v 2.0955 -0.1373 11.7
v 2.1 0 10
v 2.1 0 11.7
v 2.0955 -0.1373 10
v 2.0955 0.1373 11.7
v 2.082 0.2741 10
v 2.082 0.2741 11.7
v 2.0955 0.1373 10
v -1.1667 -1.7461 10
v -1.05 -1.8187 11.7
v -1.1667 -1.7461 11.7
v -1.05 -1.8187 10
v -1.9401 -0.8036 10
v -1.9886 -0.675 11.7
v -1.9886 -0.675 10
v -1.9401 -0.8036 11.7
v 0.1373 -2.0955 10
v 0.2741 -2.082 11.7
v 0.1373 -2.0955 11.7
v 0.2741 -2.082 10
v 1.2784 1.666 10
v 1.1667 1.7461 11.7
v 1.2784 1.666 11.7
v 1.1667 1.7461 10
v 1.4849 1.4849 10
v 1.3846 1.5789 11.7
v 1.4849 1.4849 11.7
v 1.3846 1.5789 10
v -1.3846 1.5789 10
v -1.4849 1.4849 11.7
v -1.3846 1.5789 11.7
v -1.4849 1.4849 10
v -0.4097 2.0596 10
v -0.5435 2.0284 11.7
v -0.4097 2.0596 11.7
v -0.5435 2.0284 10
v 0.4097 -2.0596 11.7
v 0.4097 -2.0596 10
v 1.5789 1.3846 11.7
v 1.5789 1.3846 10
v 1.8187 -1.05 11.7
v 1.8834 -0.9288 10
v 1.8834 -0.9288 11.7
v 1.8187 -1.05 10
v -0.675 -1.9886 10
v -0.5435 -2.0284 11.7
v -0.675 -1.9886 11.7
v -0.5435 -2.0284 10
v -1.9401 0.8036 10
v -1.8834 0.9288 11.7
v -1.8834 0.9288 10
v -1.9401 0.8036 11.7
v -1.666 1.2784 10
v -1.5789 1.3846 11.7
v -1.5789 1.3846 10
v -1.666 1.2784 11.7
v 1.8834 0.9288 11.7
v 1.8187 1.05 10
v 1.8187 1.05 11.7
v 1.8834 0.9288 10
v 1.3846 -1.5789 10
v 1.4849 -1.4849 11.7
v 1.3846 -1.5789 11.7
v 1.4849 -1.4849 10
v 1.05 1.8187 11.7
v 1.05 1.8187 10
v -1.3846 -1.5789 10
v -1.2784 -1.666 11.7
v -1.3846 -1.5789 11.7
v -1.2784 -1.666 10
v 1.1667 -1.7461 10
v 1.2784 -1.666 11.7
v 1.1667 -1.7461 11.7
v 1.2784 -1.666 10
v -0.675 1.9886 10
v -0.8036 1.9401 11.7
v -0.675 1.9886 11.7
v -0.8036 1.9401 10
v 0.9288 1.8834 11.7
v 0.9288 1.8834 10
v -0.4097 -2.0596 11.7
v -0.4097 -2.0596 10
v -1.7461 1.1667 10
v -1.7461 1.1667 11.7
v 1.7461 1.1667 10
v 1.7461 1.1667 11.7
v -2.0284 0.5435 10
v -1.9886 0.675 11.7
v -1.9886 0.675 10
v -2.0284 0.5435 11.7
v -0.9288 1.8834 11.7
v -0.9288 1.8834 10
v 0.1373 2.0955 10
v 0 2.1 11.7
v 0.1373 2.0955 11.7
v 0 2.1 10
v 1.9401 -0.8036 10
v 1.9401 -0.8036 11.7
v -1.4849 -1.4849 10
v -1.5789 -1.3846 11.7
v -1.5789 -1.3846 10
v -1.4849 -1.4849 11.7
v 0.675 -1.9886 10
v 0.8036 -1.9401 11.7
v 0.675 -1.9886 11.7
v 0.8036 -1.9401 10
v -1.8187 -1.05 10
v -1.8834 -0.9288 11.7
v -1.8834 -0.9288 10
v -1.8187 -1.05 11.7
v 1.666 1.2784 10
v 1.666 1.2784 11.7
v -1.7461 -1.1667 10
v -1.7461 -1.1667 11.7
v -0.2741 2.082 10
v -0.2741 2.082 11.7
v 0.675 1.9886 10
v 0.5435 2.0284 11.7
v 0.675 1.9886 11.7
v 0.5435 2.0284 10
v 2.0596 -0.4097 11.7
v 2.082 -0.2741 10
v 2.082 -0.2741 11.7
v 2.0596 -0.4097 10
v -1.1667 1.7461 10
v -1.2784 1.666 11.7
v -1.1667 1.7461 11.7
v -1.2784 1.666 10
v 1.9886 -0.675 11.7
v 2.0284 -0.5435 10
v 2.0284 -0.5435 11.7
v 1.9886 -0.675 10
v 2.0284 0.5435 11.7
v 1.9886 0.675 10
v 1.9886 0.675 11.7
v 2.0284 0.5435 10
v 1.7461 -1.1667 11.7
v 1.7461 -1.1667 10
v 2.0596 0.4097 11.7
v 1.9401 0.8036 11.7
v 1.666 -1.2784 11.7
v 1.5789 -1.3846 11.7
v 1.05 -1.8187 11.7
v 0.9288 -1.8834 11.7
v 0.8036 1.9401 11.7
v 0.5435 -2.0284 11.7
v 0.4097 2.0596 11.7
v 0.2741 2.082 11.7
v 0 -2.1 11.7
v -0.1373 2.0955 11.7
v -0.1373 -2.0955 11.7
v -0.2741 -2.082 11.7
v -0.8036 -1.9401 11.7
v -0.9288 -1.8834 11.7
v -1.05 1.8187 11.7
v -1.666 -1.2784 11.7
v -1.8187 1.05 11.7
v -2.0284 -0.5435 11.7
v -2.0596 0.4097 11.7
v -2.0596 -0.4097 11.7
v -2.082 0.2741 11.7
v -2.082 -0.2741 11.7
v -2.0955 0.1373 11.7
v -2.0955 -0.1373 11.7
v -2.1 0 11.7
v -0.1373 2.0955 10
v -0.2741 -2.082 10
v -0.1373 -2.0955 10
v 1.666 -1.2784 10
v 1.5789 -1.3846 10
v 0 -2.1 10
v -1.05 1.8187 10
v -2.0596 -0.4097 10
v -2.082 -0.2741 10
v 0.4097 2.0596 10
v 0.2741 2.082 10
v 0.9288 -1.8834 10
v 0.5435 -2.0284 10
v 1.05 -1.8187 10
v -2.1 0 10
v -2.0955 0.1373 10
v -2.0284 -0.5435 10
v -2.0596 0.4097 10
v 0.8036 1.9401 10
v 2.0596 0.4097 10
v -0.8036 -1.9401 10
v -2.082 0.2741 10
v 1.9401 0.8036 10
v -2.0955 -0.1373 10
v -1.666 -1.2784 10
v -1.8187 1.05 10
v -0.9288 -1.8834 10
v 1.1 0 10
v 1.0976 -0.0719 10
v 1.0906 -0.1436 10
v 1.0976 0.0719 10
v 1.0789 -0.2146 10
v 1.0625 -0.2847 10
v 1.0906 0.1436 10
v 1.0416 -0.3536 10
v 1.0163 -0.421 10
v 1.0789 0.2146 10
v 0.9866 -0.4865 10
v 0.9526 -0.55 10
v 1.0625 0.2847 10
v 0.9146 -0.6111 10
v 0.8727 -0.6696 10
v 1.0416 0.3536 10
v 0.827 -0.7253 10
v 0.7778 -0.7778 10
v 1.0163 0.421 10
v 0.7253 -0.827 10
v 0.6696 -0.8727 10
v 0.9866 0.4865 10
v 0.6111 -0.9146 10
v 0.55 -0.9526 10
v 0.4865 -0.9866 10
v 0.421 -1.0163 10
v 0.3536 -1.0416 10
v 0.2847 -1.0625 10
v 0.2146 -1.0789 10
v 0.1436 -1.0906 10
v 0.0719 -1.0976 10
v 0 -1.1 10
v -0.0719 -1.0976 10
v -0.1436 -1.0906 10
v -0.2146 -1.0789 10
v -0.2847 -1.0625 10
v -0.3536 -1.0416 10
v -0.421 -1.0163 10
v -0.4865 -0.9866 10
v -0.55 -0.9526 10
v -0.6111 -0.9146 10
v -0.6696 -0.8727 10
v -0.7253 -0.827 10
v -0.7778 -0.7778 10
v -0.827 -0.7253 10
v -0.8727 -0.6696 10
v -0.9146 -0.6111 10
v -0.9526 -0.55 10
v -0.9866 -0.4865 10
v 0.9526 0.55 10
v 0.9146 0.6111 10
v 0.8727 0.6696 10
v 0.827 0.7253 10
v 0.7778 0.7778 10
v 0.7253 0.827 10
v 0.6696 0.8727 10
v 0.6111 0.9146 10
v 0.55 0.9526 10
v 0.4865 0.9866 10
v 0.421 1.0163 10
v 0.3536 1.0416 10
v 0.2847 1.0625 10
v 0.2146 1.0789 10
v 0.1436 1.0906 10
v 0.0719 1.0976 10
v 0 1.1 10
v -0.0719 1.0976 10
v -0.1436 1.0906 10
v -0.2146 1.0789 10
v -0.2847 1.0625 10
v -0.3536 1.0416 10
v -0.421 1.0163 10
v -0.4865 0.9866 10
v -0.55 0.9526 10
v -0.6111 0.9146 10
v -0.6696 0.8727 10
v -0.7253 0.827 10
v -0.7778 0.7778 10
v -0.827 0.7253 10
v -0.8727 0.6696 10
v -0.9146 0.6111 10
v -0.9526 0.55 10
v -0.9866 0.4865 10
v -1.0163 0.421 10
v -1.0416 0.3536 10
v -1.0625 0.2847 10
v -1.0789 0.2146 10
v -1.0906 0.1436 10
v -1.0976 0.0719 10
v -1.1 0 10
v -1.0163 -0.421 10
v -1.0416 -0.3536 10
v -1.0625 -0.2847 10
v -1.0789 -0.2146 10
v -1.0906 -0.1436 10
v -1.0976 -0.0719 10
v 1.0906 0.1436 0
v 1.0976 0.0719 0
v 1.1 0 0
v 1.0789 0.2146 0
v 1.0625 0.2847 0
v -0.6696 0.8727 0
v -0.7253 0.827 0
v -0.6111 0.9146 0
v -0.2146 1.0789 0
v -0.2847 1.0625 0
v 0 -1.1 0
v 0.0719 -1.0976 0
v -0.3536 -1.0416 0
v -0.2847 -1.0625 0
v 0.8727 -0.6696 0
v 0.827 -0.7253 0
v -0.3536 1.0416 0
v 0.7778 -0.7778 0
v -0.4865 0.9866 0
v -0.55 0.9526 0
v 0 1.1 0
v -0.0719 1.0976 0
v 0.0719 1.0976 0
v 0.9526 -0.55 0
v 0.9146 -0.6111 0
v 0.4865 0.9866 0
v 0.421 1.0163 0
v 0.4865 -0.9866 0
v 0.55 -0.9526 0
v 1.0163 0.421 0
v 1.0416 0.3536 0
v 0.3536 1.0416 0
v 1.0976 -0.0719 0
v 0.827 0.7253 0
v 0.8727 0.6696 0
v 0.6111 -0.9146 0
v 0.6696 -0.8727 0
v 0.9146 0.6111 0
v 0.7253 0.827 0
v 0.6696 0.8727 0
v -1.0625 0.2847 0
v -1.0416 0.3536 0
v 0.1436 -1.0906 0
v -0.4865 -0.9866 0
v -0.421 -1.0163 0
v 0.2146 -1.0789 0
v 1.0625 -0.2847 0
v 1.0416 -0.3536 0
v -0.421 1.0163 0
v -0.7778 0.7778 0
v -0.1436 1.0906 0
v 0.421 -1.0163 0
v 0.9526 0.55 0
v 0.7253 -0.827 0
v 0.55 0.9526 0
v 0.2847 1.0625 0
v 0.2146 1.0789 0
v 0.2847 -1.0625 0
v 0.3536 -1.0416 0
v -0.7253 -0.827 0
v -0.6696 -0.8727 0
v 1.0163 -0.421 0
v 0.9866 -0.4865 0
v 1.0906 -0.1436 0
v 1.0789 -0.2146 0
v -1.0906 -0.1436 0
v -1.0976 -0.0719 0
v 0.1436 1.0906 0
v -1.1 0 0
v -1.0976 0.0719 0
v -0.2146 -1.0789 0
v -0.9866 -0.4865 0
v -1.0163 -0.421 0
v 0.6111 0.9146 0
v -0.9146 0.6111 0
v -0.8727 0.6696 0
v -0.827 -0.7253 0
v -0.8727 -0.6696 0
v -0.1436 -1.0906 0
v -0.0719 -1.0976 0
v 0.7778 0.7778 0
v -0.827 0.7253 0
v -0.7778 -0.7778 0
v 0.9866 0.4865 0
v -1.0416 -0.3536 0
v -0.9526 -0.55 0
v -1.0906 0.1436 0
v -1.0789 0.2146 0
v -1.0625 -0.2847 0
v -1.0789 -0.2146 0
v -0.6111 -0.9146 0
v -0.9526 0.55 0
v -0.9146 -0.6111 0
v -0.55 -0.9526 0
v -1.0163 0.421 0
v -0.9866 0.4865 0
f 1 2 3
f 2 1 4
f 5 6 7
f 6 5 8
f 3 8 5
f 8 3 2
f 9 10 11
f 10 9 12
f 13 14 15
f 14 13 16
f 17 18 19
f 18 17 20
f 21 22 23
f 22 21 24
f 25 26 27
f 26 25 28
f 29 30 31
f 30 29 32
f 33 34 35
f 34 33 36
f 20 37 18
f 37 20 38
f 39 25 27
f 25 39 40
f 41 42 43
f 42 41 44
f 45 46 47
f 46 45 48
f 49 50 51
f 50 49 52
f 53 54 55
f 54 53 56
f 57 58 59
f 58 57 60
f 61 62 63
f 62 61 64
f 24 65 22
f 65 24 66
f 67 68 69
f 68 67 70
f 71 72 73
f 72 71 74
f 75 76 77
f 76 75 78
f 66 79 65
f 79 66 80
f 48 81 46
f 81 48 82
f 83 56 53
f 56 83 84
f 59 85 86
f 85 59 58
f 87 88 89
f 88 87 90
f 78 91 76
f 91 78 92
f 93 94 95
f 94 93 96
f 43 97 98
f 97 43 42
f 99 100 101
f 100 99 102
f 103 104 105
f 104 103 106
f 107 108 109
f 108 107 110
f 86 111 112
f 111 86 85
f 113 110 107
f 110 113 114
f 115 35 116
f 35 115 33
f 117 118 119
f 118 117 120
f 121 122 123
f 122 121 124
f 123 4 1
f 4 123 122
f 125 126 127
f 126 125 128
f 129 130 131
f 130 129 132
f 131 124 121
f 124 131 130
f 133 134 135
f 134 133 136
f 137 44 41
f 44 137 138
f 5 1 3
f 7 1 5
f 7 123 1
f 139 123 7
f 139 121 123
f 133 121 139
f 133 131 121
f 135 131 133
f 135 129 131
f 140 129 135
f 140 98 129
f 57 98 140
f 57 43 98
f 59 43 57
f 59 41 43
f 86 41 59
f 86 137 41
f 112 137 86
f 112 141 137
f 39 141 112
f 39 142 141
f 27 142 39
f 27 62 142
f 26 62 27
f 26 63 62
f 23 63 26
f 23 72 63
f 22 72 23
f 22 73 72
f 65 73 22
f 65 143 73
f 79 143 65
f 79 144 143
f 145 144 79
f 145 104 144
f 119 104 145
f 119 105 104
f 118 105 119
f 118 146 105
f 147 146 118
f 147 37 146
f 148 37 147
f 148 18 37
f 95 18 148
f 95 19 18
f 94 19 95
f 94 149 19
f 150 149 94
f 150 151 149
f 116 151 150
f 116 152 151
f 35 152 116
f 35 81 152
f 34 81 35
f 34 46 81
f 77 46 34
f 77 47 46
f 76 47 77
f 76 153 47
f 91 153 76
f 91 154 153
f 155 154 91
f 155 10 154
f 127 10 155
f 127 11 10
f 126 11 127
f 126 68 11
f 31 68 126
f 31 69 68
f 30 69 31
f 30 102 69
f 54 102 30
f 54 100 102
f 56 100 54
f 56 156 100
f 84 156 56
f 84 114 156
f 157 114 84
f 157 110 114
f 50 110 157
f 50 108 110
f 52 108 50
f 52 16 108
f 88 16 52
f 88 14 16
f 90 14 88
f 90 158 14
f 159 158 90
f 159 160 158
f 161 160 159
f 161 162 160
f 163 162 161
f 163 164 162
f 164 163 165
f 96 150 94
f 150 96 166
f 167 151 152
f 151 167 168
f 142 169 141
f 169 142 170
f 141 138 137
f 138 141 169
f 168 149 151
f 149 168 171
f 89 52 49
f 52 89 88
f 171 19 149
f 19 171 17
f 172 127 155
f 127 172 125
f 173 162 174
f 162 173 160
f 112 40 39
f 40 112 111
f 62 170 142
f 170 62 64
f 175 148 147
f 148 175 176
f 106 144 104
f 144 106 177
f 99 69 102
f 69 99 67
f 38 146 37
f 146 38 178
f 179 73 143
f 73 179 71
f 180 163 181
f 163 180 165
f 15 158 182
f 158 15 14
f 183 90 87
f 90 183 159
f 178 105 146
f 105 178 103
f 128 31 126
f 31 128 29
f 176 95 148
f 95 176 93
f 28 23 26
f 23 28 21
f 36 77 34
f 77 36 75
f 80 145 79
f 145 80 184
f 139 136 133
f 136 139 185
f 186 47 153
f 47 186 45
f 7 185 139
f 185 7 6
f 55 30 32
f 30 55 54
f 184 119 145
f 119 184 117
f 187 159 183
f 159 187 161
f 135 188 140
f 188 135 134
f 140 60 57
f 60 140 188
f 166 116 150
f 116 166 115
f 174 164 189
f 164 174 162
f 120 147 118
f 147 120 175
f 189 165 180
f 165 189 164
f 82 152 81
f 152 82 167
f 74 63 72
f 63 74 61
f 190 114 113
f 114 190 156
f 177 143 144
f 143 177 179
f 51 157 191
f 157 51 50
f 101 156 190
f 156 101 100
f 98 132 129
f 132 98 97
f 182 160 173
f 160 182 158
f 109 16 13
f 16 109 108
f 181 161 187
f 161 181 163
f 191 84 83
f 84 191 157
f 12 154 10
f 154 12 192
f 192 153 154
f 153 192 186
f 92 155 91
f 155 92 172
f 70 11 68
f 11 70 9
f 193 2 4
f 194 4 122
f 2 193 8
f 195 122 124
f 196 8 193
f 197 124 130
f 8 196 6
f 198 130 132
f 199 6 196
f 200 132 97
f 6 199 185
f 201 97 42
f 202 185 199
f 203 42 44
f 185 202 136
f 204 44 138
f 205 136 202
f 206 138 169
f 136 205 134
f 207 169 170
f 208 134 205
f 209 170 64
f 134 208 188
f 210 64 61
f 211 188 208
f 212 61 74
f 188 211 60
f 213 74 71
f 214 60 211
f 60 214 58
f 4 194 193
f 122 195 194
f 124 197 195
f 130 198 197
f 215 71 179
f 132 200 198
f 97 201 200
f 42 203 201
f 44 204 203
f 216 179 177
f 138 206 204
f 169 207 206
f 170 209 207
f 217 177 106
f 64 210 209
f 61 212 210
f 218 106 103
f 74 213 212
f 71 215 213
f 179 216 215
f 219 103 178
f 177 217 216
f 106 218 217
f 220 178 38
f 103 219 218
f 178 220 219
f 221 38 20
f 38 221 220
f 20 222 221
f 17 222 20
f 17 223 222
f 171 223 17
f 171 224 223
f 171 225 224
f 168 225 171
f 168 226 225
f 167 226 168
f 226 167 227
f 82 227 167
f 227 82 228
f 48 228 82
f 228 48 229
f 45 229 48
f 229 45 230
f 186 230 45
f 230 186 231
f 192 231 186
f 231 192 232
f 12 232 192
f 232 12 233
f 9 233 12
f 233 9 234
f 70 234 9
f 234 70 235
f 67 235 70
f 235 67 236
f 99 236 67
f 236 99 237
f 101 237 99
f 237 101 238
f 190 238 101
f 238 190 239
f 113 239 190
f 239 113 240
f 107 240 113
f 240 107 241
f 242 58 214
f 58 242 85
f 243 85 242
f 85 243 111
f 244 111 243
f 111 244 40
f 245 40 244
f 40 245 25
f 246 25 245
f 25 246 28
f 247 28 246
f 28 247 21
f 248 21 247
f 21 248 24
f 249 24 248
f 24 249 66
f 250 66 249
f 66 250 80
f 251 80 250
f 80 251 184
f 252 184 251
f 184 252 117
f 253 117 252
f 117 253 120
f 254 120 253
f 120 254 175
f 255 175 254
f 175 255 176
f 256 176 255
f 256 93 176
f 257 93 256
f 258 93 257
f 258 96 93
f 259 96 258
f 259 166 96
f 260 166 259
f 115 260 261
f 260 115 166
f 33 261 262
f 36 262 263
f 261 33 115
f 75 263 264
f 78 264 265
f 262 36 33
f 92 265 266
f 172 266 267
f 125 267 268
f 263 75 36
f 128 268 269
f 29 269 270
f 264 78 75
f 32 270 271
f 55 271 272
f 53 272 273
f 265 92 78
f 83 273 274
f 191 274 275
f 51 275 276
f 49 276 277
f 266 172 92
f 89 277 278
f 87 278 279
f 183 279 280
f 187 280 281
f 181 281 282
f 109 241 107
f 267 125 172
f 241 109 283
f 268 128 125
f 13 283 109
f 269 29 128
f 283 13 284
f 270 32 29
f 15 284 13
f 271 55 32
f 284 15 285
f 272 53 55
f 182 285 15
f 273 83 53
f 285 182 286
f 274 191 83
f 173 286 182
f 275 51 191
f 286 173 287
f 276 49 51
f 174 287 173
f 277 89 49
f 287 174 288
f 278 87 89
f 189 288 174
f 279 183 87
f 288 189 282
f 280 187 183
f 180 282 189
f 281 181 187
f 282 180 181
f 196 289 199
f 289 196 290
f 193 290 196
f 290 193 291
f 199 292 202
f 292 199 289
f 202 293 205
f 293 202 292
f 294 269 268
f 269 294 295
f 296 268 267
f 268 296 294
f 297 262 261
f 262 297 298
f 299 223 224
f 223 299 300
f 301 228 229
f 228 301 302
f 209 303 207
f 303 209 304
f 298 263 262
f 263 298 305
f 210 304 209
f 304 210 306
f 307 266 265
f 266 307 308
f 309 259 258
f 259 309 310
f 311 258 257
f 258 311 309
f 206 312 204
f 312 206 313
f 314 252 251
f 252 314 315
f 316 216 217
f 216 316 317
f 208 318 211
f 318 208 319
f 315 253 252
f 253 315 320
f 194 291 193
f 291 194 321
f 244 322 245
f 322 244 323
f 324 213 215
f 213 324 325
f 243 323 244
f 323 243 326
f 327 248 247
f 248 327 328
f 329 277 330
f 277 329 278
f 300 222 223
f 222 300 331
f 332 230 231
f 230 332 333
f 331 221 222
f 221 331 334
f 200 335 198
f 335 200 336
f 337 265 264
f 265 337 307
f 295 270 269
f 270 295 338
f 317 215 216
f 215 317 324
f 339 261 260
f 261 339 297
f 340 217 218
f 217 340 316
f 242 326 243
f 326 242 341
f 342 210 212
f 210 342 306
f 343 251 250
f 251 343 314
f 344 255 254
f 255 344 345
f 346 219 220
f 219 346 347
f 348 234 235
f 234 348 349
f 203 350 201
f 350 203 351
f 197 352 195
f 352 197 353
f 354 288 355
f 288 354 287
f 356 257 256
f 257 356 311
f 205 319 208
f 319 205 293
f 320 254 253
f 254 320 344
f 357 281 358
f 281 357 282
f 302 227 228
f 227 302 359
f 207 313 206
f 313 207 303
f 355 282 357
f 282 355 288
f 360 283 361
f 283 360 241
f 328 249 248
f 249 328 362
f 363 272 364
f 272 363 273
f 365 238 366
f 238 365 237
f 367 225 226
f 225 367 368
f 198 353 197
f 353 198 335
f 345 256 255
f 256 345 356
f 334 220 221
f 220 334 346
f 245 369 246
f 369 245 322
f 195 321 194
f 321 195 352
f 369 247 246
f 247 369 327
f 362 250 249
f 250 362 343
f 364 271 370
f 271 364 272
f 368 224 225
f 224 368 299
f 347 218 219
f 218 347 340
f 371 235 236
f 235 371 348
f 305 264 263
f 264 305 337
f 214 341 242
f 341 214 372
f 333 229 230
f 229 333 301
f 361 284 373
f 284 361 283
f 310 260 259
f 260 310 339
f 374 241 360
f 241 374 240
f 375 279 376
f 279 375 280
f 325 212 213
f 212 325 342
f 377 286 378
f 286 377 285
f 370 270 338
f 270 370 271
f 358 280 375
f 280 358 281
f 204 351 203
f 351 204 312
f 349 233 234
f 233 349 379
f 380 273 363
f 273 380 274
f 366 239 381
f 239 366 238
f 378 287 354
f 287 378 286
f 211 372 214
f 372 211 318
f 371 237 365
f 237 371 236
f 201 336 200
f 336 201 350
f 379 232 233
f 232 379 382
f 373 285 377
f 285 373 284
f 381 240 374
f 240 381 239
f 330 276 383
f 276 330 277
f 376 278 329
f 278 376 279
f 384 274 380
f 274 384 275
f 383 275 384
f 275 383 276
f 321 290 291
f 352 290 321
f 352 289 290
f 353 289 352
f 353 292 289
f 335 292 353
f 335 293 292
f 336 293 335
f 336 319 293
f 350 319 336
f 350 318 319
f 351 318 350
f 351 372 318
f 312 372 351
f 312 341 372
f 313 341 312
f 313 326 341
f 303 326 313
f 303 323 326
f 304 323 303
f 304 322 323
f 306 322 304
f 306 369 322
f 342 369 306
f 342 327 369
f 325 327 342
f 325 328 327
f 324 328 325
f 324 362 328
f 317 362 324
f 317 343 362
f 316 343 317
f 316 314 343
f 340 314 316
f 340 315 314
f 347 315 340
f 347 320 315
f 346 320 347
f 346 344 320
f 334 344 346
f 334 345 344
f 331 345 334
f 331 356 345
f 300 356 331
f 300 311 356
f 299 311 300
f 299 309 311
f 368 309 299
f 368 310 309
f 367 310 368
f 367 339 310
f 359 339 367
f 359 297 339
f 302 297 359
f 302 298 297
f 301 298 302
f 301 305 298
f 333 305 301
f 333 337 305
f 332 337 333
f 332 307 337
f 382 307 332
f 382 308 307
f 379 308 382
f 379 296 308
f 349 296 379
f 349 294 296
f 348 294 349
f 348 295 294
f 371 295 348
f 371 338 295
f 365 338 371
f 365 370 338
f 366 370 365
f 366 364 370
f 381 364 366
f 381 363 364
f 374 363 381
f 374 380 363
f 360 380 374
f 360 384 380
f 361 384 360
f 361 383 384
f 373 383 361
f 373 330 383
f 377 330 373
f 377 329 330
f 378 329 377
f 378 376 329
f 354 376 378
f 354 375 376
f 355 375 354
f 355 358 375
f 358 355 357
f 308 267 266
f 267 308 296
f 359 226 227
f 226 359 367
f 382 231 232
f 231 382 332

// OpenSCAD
$fn = 96;

shaft_d = 2.2;
length = 10;

head_d = 4.2;
head_h = 1.7;

// Simple pan head approximation: cylindrical skirt + spherical cap
cap_r = head_d * 0.55;                 // cap sphere radius (tuned for pan-head look)
cap_center_z = head_h - cap_r;         // place sphere so top is rounded

module pan_head_screw() {
    union() {
        // Shaft
        cylinder(d = shaft_d, h = length);

        // Head (pan)
        translate([0,0,length]) {
            intersection() {
                union() {
                    // cylindrical portion
                    cylinder(d = head_d, h = head_h);

                    // rounded top
                    translate([0,0,cap_center_z])
                        sphere(r = cap_r);
                }
                // limit to head height
                cylinder(d = head_d, h = head_h);
            }
        }
    }
}

pan_head_screw();
